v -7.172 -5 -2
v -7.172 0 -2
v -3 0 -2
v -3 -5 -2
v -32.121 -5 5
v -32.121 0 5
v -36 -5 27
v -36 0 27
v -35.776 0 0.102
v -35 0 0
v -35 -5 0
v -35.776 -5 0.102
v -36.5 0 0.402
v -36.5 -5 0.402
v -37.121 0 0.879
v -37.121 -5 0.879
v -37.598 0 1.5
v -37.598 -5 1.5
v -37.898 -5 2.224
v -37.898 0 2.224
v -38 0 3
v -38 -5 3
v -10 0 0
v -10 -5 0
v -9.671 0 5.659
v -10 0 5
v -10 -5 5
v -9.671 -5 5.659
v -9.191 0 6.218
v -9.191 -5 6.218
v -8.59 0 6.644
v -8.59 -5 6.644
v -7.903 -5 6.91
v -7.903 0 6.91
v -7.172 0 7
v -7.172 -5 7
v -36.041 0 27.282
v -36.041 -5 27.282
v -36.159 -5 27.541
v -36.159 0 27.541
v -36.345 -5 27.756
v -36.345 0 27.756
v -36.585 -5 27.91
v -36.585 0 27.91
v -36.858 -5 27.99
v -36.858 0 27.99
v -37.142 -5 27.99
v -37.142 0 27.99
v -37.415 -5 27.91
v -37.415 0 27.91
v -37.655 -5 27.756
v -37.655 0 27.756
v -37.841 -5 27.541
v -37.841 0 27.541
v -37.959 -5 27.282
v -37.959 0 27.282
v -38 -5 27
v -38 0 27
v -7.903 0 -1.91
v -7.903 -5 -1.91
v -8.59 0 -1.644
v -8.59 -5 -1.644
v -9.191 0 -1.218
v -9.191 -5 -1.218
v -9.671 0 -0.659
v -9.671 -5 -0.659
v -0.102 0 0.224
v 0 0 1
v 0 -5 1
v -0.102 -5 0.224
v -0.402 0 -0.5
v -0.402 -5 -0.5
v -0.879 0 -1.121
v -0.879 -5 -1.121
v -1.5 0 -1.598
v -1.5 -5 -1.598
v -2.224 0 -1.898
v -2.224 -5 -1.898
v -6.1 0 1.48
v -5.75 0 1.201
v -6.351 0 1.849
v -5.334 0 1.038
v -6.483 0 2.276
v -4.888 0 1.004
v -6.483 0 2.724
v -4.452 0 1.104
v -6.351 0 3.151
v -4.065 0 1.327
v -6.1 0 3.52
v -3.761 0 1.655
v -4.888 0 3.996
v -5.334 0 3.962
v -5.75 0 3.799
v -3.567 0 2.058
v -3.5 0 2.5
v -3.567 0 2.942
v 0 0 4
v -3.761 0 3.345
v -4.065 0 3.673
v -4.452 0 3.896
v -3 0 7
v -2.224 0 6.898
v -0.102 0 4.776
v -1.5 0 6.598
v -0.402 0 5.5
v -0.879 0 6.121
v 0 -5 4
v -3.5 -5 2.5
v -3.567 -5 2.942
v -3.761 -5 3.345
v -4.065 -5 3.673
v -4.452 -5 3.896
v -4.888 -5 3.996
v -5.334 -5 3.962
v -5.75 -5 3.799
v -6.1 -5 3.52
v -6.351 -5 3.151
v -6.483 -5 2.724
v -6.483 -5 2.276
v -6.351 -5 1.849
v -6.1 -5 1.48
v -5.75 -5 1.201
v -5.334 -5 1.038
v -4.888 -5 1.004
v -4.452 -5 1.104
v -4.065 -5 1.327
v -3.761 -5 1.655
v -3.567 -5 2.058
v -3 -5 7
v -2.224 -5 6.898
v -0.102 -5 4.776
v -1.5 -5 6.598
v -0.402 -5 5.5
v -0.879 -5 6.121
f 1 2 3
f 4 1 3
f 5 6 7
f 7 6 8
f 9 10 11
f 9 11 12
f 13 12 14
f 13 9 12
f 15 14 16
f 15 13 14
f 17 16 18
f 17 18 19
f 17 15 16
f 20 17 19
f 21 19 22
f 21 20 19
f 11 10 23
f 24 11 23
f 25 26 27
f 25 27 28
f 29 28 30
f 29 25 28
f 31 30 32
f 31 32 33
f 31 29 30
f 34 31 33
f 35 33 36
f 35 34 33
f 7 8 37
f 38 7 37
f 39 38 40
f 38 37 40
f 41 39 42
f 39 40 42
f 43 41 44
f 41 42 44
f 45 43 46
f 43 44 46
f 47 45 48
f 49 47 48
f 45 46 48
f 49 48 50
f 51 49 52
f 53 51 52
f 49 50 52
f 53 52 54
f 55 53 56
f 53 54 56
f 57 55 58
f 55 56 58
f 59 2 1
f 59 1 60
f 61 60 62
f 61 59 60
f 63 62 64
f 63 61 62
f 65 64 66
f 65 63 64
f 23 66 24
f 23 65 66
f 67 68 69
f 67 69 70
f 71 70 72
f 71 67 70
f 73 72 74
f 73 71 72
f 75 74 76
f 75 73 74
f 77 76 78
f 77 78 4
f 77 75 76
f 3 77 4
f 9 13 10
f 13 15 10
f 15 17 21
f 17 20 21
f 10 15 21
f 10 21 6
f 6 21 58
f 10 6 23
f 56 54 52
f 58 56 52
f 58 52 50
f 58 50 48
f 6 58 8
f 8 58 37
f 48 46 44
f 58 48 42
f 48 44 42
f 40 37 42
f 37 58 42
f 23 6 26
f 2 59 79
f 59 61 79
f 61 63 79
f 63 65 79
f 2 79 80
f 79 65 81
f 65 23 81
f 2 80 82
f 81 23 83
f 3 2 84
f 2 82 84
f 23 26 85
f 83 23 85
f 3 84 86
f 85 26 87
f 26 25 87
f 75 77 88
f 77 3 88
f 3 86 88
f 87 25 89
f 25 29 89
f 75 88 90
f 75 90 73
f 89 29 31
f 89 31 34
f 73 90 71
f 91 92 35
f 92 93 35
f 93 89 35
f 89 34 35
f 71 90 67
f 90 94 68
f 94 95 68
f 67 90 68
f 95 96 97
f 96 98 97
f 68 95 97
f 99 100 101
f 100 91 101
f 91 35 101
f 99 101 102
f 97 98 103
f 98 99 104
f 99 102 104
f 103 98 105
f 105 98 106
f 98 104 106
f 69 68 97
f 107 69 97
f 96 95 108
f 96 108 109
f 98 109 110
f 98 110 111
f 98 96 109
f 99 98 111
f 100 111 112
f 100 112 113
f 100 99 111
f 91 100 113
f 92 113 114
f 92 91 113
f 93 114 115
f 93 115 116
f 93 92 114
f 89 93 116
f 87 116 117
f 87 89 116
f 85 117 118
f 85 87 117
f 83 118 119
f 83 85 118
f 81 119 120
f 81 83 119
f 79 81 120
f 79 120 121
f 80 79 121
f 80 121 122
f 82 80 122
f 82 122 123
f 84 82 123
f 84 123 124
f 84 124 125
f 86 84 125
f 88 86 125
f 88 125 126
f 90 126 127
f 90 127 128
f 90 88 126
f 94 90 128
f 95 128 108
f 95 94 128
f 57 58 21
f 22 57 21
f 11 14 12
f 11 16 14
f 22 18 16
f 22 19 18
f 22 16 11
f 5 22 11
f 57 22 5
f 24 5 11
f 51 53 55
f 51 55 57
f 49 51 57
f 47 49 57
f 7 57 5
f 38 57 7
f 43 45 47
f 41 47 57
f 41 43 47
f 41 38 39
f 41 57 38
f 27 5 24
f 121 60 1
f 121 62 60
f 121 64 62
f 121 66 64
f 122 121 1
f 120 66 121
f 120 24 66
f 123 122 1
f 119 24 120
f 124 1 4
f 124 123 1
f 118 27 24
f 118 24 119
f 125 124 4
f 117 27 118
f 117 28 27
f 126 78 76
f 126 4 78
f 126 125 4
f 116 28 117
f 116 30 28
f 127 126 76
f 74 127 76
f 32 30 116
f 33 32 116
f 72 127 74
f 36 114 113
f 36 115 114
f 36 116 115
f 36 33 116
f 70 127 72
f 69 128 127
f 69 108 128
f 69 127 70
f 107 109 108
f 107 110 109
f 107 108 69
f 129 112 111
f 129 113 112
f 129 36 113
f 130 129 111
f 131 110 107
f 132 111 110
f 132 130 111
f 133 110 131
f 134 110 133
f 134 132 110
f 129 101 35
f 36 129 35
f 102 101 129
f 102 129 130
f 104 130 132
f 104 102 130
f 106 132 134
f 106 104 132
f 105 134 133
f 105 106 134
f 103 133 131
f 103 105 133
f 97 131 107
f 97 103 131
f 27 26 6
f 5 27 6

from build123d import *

# Parameters (mm, degrees)
F0_R        = 1.5
F1_DEPTH    = 5
F2_T1_DEPTH = 20
F2_T3_DEPTH = 19.1421356237


# Not quite as in the source:
# - a fillet or chamfer that OpenCascade refuses, or shapes differently, is made with other operations: its cross-section is extruded or revolved along the edge and cut away or added


with BuildPart() as f1:
    # F0 (on Front) → F1 (new body)
    with BuildSketch(Plane.XZ):
        with BuildLine():
            Line((-38, 0), (-10, 0))
            Line((-10, 0), (-10, -2))
            Line((-10, -2), (0, -2))
            Line((0, -2), (0, 0))
            Line((0, 0), (0, 5))
            Line((0, 5), (0, 7))
            Line((0, 7), (-10, 7))
            Line((-10, 7), (-10, 5))
            Line((-10, 5), (-32.1208064244, 5))
            Line((-32.1208064244, 5), (-36, 27))
            ThreePointArc((-36, 27), (-37, 28), (-38, 27))
            Line((-38, 27), (-38, 0))
        make_face()
        with Locations((-5, 2.5)):
            Circle(F0_R, mode=Mode.SUBTRACT)
    extrude(amount=F1_DEPTH)

    # F2: fillet of radius 3 on 5 edges, made by hand

    # F2_s2 → F2_t1 (cut)
    with BuildSketch(Plane.XZ.offset(-7.5)):
        with BuildLine():
            ThreePointArc((-3, 7), (-0.8786796564, 6.1213203436), (0, 4))
            Line((0, 4), (0, 7))
            Line((0, 7), (-3, 7))
        make_face()
        with BuildLine():
            ThreePointArc((0, 1), (-0.8786796564, -1.1213203436), (-3, -2))
            Line((-3, -2), (0, -2))
            Line((0, -2), (0, 1))
        make_face()
        with BuildLine():
            ThreePointArc((-35, 0), (-37.1213203436, 0.8786796564), (-38, 3))
            Line((-38, 3), (-38, 0))
            Line((-38, 0), (-35, 0))
        make_face()
    extrude(amount=F2_T1_DEPTH, mode=Mode.SUBTRACT)

    # F2_s4 → F2_t3 (cut)
    with BuildSketch(Plane.XZ.offset(-7.0710678119)):
        with BuildLine():
            ThreePointArc((-10, 5), (-8.9036236828, 6.4494897428), (-7.1715728753, 7))
            Line((-7.1715728753, 7), (-10, 7))
            Line((-10, 7), (-10, 5))
        make_face()
        with BuildLine():
            ThreePointArc((-7.1715728753, -2), (-8.9036236828, -1.4494897428), (-10, 0))
            Line((-10, 0), (-10, -2))
            Line((-10, -2), (-7.1715728753, -2))
        make_face()
    extrude(amount=F2_T3_DEPTH, mode=Mode.SUBTRACT)


solid = f1.part
